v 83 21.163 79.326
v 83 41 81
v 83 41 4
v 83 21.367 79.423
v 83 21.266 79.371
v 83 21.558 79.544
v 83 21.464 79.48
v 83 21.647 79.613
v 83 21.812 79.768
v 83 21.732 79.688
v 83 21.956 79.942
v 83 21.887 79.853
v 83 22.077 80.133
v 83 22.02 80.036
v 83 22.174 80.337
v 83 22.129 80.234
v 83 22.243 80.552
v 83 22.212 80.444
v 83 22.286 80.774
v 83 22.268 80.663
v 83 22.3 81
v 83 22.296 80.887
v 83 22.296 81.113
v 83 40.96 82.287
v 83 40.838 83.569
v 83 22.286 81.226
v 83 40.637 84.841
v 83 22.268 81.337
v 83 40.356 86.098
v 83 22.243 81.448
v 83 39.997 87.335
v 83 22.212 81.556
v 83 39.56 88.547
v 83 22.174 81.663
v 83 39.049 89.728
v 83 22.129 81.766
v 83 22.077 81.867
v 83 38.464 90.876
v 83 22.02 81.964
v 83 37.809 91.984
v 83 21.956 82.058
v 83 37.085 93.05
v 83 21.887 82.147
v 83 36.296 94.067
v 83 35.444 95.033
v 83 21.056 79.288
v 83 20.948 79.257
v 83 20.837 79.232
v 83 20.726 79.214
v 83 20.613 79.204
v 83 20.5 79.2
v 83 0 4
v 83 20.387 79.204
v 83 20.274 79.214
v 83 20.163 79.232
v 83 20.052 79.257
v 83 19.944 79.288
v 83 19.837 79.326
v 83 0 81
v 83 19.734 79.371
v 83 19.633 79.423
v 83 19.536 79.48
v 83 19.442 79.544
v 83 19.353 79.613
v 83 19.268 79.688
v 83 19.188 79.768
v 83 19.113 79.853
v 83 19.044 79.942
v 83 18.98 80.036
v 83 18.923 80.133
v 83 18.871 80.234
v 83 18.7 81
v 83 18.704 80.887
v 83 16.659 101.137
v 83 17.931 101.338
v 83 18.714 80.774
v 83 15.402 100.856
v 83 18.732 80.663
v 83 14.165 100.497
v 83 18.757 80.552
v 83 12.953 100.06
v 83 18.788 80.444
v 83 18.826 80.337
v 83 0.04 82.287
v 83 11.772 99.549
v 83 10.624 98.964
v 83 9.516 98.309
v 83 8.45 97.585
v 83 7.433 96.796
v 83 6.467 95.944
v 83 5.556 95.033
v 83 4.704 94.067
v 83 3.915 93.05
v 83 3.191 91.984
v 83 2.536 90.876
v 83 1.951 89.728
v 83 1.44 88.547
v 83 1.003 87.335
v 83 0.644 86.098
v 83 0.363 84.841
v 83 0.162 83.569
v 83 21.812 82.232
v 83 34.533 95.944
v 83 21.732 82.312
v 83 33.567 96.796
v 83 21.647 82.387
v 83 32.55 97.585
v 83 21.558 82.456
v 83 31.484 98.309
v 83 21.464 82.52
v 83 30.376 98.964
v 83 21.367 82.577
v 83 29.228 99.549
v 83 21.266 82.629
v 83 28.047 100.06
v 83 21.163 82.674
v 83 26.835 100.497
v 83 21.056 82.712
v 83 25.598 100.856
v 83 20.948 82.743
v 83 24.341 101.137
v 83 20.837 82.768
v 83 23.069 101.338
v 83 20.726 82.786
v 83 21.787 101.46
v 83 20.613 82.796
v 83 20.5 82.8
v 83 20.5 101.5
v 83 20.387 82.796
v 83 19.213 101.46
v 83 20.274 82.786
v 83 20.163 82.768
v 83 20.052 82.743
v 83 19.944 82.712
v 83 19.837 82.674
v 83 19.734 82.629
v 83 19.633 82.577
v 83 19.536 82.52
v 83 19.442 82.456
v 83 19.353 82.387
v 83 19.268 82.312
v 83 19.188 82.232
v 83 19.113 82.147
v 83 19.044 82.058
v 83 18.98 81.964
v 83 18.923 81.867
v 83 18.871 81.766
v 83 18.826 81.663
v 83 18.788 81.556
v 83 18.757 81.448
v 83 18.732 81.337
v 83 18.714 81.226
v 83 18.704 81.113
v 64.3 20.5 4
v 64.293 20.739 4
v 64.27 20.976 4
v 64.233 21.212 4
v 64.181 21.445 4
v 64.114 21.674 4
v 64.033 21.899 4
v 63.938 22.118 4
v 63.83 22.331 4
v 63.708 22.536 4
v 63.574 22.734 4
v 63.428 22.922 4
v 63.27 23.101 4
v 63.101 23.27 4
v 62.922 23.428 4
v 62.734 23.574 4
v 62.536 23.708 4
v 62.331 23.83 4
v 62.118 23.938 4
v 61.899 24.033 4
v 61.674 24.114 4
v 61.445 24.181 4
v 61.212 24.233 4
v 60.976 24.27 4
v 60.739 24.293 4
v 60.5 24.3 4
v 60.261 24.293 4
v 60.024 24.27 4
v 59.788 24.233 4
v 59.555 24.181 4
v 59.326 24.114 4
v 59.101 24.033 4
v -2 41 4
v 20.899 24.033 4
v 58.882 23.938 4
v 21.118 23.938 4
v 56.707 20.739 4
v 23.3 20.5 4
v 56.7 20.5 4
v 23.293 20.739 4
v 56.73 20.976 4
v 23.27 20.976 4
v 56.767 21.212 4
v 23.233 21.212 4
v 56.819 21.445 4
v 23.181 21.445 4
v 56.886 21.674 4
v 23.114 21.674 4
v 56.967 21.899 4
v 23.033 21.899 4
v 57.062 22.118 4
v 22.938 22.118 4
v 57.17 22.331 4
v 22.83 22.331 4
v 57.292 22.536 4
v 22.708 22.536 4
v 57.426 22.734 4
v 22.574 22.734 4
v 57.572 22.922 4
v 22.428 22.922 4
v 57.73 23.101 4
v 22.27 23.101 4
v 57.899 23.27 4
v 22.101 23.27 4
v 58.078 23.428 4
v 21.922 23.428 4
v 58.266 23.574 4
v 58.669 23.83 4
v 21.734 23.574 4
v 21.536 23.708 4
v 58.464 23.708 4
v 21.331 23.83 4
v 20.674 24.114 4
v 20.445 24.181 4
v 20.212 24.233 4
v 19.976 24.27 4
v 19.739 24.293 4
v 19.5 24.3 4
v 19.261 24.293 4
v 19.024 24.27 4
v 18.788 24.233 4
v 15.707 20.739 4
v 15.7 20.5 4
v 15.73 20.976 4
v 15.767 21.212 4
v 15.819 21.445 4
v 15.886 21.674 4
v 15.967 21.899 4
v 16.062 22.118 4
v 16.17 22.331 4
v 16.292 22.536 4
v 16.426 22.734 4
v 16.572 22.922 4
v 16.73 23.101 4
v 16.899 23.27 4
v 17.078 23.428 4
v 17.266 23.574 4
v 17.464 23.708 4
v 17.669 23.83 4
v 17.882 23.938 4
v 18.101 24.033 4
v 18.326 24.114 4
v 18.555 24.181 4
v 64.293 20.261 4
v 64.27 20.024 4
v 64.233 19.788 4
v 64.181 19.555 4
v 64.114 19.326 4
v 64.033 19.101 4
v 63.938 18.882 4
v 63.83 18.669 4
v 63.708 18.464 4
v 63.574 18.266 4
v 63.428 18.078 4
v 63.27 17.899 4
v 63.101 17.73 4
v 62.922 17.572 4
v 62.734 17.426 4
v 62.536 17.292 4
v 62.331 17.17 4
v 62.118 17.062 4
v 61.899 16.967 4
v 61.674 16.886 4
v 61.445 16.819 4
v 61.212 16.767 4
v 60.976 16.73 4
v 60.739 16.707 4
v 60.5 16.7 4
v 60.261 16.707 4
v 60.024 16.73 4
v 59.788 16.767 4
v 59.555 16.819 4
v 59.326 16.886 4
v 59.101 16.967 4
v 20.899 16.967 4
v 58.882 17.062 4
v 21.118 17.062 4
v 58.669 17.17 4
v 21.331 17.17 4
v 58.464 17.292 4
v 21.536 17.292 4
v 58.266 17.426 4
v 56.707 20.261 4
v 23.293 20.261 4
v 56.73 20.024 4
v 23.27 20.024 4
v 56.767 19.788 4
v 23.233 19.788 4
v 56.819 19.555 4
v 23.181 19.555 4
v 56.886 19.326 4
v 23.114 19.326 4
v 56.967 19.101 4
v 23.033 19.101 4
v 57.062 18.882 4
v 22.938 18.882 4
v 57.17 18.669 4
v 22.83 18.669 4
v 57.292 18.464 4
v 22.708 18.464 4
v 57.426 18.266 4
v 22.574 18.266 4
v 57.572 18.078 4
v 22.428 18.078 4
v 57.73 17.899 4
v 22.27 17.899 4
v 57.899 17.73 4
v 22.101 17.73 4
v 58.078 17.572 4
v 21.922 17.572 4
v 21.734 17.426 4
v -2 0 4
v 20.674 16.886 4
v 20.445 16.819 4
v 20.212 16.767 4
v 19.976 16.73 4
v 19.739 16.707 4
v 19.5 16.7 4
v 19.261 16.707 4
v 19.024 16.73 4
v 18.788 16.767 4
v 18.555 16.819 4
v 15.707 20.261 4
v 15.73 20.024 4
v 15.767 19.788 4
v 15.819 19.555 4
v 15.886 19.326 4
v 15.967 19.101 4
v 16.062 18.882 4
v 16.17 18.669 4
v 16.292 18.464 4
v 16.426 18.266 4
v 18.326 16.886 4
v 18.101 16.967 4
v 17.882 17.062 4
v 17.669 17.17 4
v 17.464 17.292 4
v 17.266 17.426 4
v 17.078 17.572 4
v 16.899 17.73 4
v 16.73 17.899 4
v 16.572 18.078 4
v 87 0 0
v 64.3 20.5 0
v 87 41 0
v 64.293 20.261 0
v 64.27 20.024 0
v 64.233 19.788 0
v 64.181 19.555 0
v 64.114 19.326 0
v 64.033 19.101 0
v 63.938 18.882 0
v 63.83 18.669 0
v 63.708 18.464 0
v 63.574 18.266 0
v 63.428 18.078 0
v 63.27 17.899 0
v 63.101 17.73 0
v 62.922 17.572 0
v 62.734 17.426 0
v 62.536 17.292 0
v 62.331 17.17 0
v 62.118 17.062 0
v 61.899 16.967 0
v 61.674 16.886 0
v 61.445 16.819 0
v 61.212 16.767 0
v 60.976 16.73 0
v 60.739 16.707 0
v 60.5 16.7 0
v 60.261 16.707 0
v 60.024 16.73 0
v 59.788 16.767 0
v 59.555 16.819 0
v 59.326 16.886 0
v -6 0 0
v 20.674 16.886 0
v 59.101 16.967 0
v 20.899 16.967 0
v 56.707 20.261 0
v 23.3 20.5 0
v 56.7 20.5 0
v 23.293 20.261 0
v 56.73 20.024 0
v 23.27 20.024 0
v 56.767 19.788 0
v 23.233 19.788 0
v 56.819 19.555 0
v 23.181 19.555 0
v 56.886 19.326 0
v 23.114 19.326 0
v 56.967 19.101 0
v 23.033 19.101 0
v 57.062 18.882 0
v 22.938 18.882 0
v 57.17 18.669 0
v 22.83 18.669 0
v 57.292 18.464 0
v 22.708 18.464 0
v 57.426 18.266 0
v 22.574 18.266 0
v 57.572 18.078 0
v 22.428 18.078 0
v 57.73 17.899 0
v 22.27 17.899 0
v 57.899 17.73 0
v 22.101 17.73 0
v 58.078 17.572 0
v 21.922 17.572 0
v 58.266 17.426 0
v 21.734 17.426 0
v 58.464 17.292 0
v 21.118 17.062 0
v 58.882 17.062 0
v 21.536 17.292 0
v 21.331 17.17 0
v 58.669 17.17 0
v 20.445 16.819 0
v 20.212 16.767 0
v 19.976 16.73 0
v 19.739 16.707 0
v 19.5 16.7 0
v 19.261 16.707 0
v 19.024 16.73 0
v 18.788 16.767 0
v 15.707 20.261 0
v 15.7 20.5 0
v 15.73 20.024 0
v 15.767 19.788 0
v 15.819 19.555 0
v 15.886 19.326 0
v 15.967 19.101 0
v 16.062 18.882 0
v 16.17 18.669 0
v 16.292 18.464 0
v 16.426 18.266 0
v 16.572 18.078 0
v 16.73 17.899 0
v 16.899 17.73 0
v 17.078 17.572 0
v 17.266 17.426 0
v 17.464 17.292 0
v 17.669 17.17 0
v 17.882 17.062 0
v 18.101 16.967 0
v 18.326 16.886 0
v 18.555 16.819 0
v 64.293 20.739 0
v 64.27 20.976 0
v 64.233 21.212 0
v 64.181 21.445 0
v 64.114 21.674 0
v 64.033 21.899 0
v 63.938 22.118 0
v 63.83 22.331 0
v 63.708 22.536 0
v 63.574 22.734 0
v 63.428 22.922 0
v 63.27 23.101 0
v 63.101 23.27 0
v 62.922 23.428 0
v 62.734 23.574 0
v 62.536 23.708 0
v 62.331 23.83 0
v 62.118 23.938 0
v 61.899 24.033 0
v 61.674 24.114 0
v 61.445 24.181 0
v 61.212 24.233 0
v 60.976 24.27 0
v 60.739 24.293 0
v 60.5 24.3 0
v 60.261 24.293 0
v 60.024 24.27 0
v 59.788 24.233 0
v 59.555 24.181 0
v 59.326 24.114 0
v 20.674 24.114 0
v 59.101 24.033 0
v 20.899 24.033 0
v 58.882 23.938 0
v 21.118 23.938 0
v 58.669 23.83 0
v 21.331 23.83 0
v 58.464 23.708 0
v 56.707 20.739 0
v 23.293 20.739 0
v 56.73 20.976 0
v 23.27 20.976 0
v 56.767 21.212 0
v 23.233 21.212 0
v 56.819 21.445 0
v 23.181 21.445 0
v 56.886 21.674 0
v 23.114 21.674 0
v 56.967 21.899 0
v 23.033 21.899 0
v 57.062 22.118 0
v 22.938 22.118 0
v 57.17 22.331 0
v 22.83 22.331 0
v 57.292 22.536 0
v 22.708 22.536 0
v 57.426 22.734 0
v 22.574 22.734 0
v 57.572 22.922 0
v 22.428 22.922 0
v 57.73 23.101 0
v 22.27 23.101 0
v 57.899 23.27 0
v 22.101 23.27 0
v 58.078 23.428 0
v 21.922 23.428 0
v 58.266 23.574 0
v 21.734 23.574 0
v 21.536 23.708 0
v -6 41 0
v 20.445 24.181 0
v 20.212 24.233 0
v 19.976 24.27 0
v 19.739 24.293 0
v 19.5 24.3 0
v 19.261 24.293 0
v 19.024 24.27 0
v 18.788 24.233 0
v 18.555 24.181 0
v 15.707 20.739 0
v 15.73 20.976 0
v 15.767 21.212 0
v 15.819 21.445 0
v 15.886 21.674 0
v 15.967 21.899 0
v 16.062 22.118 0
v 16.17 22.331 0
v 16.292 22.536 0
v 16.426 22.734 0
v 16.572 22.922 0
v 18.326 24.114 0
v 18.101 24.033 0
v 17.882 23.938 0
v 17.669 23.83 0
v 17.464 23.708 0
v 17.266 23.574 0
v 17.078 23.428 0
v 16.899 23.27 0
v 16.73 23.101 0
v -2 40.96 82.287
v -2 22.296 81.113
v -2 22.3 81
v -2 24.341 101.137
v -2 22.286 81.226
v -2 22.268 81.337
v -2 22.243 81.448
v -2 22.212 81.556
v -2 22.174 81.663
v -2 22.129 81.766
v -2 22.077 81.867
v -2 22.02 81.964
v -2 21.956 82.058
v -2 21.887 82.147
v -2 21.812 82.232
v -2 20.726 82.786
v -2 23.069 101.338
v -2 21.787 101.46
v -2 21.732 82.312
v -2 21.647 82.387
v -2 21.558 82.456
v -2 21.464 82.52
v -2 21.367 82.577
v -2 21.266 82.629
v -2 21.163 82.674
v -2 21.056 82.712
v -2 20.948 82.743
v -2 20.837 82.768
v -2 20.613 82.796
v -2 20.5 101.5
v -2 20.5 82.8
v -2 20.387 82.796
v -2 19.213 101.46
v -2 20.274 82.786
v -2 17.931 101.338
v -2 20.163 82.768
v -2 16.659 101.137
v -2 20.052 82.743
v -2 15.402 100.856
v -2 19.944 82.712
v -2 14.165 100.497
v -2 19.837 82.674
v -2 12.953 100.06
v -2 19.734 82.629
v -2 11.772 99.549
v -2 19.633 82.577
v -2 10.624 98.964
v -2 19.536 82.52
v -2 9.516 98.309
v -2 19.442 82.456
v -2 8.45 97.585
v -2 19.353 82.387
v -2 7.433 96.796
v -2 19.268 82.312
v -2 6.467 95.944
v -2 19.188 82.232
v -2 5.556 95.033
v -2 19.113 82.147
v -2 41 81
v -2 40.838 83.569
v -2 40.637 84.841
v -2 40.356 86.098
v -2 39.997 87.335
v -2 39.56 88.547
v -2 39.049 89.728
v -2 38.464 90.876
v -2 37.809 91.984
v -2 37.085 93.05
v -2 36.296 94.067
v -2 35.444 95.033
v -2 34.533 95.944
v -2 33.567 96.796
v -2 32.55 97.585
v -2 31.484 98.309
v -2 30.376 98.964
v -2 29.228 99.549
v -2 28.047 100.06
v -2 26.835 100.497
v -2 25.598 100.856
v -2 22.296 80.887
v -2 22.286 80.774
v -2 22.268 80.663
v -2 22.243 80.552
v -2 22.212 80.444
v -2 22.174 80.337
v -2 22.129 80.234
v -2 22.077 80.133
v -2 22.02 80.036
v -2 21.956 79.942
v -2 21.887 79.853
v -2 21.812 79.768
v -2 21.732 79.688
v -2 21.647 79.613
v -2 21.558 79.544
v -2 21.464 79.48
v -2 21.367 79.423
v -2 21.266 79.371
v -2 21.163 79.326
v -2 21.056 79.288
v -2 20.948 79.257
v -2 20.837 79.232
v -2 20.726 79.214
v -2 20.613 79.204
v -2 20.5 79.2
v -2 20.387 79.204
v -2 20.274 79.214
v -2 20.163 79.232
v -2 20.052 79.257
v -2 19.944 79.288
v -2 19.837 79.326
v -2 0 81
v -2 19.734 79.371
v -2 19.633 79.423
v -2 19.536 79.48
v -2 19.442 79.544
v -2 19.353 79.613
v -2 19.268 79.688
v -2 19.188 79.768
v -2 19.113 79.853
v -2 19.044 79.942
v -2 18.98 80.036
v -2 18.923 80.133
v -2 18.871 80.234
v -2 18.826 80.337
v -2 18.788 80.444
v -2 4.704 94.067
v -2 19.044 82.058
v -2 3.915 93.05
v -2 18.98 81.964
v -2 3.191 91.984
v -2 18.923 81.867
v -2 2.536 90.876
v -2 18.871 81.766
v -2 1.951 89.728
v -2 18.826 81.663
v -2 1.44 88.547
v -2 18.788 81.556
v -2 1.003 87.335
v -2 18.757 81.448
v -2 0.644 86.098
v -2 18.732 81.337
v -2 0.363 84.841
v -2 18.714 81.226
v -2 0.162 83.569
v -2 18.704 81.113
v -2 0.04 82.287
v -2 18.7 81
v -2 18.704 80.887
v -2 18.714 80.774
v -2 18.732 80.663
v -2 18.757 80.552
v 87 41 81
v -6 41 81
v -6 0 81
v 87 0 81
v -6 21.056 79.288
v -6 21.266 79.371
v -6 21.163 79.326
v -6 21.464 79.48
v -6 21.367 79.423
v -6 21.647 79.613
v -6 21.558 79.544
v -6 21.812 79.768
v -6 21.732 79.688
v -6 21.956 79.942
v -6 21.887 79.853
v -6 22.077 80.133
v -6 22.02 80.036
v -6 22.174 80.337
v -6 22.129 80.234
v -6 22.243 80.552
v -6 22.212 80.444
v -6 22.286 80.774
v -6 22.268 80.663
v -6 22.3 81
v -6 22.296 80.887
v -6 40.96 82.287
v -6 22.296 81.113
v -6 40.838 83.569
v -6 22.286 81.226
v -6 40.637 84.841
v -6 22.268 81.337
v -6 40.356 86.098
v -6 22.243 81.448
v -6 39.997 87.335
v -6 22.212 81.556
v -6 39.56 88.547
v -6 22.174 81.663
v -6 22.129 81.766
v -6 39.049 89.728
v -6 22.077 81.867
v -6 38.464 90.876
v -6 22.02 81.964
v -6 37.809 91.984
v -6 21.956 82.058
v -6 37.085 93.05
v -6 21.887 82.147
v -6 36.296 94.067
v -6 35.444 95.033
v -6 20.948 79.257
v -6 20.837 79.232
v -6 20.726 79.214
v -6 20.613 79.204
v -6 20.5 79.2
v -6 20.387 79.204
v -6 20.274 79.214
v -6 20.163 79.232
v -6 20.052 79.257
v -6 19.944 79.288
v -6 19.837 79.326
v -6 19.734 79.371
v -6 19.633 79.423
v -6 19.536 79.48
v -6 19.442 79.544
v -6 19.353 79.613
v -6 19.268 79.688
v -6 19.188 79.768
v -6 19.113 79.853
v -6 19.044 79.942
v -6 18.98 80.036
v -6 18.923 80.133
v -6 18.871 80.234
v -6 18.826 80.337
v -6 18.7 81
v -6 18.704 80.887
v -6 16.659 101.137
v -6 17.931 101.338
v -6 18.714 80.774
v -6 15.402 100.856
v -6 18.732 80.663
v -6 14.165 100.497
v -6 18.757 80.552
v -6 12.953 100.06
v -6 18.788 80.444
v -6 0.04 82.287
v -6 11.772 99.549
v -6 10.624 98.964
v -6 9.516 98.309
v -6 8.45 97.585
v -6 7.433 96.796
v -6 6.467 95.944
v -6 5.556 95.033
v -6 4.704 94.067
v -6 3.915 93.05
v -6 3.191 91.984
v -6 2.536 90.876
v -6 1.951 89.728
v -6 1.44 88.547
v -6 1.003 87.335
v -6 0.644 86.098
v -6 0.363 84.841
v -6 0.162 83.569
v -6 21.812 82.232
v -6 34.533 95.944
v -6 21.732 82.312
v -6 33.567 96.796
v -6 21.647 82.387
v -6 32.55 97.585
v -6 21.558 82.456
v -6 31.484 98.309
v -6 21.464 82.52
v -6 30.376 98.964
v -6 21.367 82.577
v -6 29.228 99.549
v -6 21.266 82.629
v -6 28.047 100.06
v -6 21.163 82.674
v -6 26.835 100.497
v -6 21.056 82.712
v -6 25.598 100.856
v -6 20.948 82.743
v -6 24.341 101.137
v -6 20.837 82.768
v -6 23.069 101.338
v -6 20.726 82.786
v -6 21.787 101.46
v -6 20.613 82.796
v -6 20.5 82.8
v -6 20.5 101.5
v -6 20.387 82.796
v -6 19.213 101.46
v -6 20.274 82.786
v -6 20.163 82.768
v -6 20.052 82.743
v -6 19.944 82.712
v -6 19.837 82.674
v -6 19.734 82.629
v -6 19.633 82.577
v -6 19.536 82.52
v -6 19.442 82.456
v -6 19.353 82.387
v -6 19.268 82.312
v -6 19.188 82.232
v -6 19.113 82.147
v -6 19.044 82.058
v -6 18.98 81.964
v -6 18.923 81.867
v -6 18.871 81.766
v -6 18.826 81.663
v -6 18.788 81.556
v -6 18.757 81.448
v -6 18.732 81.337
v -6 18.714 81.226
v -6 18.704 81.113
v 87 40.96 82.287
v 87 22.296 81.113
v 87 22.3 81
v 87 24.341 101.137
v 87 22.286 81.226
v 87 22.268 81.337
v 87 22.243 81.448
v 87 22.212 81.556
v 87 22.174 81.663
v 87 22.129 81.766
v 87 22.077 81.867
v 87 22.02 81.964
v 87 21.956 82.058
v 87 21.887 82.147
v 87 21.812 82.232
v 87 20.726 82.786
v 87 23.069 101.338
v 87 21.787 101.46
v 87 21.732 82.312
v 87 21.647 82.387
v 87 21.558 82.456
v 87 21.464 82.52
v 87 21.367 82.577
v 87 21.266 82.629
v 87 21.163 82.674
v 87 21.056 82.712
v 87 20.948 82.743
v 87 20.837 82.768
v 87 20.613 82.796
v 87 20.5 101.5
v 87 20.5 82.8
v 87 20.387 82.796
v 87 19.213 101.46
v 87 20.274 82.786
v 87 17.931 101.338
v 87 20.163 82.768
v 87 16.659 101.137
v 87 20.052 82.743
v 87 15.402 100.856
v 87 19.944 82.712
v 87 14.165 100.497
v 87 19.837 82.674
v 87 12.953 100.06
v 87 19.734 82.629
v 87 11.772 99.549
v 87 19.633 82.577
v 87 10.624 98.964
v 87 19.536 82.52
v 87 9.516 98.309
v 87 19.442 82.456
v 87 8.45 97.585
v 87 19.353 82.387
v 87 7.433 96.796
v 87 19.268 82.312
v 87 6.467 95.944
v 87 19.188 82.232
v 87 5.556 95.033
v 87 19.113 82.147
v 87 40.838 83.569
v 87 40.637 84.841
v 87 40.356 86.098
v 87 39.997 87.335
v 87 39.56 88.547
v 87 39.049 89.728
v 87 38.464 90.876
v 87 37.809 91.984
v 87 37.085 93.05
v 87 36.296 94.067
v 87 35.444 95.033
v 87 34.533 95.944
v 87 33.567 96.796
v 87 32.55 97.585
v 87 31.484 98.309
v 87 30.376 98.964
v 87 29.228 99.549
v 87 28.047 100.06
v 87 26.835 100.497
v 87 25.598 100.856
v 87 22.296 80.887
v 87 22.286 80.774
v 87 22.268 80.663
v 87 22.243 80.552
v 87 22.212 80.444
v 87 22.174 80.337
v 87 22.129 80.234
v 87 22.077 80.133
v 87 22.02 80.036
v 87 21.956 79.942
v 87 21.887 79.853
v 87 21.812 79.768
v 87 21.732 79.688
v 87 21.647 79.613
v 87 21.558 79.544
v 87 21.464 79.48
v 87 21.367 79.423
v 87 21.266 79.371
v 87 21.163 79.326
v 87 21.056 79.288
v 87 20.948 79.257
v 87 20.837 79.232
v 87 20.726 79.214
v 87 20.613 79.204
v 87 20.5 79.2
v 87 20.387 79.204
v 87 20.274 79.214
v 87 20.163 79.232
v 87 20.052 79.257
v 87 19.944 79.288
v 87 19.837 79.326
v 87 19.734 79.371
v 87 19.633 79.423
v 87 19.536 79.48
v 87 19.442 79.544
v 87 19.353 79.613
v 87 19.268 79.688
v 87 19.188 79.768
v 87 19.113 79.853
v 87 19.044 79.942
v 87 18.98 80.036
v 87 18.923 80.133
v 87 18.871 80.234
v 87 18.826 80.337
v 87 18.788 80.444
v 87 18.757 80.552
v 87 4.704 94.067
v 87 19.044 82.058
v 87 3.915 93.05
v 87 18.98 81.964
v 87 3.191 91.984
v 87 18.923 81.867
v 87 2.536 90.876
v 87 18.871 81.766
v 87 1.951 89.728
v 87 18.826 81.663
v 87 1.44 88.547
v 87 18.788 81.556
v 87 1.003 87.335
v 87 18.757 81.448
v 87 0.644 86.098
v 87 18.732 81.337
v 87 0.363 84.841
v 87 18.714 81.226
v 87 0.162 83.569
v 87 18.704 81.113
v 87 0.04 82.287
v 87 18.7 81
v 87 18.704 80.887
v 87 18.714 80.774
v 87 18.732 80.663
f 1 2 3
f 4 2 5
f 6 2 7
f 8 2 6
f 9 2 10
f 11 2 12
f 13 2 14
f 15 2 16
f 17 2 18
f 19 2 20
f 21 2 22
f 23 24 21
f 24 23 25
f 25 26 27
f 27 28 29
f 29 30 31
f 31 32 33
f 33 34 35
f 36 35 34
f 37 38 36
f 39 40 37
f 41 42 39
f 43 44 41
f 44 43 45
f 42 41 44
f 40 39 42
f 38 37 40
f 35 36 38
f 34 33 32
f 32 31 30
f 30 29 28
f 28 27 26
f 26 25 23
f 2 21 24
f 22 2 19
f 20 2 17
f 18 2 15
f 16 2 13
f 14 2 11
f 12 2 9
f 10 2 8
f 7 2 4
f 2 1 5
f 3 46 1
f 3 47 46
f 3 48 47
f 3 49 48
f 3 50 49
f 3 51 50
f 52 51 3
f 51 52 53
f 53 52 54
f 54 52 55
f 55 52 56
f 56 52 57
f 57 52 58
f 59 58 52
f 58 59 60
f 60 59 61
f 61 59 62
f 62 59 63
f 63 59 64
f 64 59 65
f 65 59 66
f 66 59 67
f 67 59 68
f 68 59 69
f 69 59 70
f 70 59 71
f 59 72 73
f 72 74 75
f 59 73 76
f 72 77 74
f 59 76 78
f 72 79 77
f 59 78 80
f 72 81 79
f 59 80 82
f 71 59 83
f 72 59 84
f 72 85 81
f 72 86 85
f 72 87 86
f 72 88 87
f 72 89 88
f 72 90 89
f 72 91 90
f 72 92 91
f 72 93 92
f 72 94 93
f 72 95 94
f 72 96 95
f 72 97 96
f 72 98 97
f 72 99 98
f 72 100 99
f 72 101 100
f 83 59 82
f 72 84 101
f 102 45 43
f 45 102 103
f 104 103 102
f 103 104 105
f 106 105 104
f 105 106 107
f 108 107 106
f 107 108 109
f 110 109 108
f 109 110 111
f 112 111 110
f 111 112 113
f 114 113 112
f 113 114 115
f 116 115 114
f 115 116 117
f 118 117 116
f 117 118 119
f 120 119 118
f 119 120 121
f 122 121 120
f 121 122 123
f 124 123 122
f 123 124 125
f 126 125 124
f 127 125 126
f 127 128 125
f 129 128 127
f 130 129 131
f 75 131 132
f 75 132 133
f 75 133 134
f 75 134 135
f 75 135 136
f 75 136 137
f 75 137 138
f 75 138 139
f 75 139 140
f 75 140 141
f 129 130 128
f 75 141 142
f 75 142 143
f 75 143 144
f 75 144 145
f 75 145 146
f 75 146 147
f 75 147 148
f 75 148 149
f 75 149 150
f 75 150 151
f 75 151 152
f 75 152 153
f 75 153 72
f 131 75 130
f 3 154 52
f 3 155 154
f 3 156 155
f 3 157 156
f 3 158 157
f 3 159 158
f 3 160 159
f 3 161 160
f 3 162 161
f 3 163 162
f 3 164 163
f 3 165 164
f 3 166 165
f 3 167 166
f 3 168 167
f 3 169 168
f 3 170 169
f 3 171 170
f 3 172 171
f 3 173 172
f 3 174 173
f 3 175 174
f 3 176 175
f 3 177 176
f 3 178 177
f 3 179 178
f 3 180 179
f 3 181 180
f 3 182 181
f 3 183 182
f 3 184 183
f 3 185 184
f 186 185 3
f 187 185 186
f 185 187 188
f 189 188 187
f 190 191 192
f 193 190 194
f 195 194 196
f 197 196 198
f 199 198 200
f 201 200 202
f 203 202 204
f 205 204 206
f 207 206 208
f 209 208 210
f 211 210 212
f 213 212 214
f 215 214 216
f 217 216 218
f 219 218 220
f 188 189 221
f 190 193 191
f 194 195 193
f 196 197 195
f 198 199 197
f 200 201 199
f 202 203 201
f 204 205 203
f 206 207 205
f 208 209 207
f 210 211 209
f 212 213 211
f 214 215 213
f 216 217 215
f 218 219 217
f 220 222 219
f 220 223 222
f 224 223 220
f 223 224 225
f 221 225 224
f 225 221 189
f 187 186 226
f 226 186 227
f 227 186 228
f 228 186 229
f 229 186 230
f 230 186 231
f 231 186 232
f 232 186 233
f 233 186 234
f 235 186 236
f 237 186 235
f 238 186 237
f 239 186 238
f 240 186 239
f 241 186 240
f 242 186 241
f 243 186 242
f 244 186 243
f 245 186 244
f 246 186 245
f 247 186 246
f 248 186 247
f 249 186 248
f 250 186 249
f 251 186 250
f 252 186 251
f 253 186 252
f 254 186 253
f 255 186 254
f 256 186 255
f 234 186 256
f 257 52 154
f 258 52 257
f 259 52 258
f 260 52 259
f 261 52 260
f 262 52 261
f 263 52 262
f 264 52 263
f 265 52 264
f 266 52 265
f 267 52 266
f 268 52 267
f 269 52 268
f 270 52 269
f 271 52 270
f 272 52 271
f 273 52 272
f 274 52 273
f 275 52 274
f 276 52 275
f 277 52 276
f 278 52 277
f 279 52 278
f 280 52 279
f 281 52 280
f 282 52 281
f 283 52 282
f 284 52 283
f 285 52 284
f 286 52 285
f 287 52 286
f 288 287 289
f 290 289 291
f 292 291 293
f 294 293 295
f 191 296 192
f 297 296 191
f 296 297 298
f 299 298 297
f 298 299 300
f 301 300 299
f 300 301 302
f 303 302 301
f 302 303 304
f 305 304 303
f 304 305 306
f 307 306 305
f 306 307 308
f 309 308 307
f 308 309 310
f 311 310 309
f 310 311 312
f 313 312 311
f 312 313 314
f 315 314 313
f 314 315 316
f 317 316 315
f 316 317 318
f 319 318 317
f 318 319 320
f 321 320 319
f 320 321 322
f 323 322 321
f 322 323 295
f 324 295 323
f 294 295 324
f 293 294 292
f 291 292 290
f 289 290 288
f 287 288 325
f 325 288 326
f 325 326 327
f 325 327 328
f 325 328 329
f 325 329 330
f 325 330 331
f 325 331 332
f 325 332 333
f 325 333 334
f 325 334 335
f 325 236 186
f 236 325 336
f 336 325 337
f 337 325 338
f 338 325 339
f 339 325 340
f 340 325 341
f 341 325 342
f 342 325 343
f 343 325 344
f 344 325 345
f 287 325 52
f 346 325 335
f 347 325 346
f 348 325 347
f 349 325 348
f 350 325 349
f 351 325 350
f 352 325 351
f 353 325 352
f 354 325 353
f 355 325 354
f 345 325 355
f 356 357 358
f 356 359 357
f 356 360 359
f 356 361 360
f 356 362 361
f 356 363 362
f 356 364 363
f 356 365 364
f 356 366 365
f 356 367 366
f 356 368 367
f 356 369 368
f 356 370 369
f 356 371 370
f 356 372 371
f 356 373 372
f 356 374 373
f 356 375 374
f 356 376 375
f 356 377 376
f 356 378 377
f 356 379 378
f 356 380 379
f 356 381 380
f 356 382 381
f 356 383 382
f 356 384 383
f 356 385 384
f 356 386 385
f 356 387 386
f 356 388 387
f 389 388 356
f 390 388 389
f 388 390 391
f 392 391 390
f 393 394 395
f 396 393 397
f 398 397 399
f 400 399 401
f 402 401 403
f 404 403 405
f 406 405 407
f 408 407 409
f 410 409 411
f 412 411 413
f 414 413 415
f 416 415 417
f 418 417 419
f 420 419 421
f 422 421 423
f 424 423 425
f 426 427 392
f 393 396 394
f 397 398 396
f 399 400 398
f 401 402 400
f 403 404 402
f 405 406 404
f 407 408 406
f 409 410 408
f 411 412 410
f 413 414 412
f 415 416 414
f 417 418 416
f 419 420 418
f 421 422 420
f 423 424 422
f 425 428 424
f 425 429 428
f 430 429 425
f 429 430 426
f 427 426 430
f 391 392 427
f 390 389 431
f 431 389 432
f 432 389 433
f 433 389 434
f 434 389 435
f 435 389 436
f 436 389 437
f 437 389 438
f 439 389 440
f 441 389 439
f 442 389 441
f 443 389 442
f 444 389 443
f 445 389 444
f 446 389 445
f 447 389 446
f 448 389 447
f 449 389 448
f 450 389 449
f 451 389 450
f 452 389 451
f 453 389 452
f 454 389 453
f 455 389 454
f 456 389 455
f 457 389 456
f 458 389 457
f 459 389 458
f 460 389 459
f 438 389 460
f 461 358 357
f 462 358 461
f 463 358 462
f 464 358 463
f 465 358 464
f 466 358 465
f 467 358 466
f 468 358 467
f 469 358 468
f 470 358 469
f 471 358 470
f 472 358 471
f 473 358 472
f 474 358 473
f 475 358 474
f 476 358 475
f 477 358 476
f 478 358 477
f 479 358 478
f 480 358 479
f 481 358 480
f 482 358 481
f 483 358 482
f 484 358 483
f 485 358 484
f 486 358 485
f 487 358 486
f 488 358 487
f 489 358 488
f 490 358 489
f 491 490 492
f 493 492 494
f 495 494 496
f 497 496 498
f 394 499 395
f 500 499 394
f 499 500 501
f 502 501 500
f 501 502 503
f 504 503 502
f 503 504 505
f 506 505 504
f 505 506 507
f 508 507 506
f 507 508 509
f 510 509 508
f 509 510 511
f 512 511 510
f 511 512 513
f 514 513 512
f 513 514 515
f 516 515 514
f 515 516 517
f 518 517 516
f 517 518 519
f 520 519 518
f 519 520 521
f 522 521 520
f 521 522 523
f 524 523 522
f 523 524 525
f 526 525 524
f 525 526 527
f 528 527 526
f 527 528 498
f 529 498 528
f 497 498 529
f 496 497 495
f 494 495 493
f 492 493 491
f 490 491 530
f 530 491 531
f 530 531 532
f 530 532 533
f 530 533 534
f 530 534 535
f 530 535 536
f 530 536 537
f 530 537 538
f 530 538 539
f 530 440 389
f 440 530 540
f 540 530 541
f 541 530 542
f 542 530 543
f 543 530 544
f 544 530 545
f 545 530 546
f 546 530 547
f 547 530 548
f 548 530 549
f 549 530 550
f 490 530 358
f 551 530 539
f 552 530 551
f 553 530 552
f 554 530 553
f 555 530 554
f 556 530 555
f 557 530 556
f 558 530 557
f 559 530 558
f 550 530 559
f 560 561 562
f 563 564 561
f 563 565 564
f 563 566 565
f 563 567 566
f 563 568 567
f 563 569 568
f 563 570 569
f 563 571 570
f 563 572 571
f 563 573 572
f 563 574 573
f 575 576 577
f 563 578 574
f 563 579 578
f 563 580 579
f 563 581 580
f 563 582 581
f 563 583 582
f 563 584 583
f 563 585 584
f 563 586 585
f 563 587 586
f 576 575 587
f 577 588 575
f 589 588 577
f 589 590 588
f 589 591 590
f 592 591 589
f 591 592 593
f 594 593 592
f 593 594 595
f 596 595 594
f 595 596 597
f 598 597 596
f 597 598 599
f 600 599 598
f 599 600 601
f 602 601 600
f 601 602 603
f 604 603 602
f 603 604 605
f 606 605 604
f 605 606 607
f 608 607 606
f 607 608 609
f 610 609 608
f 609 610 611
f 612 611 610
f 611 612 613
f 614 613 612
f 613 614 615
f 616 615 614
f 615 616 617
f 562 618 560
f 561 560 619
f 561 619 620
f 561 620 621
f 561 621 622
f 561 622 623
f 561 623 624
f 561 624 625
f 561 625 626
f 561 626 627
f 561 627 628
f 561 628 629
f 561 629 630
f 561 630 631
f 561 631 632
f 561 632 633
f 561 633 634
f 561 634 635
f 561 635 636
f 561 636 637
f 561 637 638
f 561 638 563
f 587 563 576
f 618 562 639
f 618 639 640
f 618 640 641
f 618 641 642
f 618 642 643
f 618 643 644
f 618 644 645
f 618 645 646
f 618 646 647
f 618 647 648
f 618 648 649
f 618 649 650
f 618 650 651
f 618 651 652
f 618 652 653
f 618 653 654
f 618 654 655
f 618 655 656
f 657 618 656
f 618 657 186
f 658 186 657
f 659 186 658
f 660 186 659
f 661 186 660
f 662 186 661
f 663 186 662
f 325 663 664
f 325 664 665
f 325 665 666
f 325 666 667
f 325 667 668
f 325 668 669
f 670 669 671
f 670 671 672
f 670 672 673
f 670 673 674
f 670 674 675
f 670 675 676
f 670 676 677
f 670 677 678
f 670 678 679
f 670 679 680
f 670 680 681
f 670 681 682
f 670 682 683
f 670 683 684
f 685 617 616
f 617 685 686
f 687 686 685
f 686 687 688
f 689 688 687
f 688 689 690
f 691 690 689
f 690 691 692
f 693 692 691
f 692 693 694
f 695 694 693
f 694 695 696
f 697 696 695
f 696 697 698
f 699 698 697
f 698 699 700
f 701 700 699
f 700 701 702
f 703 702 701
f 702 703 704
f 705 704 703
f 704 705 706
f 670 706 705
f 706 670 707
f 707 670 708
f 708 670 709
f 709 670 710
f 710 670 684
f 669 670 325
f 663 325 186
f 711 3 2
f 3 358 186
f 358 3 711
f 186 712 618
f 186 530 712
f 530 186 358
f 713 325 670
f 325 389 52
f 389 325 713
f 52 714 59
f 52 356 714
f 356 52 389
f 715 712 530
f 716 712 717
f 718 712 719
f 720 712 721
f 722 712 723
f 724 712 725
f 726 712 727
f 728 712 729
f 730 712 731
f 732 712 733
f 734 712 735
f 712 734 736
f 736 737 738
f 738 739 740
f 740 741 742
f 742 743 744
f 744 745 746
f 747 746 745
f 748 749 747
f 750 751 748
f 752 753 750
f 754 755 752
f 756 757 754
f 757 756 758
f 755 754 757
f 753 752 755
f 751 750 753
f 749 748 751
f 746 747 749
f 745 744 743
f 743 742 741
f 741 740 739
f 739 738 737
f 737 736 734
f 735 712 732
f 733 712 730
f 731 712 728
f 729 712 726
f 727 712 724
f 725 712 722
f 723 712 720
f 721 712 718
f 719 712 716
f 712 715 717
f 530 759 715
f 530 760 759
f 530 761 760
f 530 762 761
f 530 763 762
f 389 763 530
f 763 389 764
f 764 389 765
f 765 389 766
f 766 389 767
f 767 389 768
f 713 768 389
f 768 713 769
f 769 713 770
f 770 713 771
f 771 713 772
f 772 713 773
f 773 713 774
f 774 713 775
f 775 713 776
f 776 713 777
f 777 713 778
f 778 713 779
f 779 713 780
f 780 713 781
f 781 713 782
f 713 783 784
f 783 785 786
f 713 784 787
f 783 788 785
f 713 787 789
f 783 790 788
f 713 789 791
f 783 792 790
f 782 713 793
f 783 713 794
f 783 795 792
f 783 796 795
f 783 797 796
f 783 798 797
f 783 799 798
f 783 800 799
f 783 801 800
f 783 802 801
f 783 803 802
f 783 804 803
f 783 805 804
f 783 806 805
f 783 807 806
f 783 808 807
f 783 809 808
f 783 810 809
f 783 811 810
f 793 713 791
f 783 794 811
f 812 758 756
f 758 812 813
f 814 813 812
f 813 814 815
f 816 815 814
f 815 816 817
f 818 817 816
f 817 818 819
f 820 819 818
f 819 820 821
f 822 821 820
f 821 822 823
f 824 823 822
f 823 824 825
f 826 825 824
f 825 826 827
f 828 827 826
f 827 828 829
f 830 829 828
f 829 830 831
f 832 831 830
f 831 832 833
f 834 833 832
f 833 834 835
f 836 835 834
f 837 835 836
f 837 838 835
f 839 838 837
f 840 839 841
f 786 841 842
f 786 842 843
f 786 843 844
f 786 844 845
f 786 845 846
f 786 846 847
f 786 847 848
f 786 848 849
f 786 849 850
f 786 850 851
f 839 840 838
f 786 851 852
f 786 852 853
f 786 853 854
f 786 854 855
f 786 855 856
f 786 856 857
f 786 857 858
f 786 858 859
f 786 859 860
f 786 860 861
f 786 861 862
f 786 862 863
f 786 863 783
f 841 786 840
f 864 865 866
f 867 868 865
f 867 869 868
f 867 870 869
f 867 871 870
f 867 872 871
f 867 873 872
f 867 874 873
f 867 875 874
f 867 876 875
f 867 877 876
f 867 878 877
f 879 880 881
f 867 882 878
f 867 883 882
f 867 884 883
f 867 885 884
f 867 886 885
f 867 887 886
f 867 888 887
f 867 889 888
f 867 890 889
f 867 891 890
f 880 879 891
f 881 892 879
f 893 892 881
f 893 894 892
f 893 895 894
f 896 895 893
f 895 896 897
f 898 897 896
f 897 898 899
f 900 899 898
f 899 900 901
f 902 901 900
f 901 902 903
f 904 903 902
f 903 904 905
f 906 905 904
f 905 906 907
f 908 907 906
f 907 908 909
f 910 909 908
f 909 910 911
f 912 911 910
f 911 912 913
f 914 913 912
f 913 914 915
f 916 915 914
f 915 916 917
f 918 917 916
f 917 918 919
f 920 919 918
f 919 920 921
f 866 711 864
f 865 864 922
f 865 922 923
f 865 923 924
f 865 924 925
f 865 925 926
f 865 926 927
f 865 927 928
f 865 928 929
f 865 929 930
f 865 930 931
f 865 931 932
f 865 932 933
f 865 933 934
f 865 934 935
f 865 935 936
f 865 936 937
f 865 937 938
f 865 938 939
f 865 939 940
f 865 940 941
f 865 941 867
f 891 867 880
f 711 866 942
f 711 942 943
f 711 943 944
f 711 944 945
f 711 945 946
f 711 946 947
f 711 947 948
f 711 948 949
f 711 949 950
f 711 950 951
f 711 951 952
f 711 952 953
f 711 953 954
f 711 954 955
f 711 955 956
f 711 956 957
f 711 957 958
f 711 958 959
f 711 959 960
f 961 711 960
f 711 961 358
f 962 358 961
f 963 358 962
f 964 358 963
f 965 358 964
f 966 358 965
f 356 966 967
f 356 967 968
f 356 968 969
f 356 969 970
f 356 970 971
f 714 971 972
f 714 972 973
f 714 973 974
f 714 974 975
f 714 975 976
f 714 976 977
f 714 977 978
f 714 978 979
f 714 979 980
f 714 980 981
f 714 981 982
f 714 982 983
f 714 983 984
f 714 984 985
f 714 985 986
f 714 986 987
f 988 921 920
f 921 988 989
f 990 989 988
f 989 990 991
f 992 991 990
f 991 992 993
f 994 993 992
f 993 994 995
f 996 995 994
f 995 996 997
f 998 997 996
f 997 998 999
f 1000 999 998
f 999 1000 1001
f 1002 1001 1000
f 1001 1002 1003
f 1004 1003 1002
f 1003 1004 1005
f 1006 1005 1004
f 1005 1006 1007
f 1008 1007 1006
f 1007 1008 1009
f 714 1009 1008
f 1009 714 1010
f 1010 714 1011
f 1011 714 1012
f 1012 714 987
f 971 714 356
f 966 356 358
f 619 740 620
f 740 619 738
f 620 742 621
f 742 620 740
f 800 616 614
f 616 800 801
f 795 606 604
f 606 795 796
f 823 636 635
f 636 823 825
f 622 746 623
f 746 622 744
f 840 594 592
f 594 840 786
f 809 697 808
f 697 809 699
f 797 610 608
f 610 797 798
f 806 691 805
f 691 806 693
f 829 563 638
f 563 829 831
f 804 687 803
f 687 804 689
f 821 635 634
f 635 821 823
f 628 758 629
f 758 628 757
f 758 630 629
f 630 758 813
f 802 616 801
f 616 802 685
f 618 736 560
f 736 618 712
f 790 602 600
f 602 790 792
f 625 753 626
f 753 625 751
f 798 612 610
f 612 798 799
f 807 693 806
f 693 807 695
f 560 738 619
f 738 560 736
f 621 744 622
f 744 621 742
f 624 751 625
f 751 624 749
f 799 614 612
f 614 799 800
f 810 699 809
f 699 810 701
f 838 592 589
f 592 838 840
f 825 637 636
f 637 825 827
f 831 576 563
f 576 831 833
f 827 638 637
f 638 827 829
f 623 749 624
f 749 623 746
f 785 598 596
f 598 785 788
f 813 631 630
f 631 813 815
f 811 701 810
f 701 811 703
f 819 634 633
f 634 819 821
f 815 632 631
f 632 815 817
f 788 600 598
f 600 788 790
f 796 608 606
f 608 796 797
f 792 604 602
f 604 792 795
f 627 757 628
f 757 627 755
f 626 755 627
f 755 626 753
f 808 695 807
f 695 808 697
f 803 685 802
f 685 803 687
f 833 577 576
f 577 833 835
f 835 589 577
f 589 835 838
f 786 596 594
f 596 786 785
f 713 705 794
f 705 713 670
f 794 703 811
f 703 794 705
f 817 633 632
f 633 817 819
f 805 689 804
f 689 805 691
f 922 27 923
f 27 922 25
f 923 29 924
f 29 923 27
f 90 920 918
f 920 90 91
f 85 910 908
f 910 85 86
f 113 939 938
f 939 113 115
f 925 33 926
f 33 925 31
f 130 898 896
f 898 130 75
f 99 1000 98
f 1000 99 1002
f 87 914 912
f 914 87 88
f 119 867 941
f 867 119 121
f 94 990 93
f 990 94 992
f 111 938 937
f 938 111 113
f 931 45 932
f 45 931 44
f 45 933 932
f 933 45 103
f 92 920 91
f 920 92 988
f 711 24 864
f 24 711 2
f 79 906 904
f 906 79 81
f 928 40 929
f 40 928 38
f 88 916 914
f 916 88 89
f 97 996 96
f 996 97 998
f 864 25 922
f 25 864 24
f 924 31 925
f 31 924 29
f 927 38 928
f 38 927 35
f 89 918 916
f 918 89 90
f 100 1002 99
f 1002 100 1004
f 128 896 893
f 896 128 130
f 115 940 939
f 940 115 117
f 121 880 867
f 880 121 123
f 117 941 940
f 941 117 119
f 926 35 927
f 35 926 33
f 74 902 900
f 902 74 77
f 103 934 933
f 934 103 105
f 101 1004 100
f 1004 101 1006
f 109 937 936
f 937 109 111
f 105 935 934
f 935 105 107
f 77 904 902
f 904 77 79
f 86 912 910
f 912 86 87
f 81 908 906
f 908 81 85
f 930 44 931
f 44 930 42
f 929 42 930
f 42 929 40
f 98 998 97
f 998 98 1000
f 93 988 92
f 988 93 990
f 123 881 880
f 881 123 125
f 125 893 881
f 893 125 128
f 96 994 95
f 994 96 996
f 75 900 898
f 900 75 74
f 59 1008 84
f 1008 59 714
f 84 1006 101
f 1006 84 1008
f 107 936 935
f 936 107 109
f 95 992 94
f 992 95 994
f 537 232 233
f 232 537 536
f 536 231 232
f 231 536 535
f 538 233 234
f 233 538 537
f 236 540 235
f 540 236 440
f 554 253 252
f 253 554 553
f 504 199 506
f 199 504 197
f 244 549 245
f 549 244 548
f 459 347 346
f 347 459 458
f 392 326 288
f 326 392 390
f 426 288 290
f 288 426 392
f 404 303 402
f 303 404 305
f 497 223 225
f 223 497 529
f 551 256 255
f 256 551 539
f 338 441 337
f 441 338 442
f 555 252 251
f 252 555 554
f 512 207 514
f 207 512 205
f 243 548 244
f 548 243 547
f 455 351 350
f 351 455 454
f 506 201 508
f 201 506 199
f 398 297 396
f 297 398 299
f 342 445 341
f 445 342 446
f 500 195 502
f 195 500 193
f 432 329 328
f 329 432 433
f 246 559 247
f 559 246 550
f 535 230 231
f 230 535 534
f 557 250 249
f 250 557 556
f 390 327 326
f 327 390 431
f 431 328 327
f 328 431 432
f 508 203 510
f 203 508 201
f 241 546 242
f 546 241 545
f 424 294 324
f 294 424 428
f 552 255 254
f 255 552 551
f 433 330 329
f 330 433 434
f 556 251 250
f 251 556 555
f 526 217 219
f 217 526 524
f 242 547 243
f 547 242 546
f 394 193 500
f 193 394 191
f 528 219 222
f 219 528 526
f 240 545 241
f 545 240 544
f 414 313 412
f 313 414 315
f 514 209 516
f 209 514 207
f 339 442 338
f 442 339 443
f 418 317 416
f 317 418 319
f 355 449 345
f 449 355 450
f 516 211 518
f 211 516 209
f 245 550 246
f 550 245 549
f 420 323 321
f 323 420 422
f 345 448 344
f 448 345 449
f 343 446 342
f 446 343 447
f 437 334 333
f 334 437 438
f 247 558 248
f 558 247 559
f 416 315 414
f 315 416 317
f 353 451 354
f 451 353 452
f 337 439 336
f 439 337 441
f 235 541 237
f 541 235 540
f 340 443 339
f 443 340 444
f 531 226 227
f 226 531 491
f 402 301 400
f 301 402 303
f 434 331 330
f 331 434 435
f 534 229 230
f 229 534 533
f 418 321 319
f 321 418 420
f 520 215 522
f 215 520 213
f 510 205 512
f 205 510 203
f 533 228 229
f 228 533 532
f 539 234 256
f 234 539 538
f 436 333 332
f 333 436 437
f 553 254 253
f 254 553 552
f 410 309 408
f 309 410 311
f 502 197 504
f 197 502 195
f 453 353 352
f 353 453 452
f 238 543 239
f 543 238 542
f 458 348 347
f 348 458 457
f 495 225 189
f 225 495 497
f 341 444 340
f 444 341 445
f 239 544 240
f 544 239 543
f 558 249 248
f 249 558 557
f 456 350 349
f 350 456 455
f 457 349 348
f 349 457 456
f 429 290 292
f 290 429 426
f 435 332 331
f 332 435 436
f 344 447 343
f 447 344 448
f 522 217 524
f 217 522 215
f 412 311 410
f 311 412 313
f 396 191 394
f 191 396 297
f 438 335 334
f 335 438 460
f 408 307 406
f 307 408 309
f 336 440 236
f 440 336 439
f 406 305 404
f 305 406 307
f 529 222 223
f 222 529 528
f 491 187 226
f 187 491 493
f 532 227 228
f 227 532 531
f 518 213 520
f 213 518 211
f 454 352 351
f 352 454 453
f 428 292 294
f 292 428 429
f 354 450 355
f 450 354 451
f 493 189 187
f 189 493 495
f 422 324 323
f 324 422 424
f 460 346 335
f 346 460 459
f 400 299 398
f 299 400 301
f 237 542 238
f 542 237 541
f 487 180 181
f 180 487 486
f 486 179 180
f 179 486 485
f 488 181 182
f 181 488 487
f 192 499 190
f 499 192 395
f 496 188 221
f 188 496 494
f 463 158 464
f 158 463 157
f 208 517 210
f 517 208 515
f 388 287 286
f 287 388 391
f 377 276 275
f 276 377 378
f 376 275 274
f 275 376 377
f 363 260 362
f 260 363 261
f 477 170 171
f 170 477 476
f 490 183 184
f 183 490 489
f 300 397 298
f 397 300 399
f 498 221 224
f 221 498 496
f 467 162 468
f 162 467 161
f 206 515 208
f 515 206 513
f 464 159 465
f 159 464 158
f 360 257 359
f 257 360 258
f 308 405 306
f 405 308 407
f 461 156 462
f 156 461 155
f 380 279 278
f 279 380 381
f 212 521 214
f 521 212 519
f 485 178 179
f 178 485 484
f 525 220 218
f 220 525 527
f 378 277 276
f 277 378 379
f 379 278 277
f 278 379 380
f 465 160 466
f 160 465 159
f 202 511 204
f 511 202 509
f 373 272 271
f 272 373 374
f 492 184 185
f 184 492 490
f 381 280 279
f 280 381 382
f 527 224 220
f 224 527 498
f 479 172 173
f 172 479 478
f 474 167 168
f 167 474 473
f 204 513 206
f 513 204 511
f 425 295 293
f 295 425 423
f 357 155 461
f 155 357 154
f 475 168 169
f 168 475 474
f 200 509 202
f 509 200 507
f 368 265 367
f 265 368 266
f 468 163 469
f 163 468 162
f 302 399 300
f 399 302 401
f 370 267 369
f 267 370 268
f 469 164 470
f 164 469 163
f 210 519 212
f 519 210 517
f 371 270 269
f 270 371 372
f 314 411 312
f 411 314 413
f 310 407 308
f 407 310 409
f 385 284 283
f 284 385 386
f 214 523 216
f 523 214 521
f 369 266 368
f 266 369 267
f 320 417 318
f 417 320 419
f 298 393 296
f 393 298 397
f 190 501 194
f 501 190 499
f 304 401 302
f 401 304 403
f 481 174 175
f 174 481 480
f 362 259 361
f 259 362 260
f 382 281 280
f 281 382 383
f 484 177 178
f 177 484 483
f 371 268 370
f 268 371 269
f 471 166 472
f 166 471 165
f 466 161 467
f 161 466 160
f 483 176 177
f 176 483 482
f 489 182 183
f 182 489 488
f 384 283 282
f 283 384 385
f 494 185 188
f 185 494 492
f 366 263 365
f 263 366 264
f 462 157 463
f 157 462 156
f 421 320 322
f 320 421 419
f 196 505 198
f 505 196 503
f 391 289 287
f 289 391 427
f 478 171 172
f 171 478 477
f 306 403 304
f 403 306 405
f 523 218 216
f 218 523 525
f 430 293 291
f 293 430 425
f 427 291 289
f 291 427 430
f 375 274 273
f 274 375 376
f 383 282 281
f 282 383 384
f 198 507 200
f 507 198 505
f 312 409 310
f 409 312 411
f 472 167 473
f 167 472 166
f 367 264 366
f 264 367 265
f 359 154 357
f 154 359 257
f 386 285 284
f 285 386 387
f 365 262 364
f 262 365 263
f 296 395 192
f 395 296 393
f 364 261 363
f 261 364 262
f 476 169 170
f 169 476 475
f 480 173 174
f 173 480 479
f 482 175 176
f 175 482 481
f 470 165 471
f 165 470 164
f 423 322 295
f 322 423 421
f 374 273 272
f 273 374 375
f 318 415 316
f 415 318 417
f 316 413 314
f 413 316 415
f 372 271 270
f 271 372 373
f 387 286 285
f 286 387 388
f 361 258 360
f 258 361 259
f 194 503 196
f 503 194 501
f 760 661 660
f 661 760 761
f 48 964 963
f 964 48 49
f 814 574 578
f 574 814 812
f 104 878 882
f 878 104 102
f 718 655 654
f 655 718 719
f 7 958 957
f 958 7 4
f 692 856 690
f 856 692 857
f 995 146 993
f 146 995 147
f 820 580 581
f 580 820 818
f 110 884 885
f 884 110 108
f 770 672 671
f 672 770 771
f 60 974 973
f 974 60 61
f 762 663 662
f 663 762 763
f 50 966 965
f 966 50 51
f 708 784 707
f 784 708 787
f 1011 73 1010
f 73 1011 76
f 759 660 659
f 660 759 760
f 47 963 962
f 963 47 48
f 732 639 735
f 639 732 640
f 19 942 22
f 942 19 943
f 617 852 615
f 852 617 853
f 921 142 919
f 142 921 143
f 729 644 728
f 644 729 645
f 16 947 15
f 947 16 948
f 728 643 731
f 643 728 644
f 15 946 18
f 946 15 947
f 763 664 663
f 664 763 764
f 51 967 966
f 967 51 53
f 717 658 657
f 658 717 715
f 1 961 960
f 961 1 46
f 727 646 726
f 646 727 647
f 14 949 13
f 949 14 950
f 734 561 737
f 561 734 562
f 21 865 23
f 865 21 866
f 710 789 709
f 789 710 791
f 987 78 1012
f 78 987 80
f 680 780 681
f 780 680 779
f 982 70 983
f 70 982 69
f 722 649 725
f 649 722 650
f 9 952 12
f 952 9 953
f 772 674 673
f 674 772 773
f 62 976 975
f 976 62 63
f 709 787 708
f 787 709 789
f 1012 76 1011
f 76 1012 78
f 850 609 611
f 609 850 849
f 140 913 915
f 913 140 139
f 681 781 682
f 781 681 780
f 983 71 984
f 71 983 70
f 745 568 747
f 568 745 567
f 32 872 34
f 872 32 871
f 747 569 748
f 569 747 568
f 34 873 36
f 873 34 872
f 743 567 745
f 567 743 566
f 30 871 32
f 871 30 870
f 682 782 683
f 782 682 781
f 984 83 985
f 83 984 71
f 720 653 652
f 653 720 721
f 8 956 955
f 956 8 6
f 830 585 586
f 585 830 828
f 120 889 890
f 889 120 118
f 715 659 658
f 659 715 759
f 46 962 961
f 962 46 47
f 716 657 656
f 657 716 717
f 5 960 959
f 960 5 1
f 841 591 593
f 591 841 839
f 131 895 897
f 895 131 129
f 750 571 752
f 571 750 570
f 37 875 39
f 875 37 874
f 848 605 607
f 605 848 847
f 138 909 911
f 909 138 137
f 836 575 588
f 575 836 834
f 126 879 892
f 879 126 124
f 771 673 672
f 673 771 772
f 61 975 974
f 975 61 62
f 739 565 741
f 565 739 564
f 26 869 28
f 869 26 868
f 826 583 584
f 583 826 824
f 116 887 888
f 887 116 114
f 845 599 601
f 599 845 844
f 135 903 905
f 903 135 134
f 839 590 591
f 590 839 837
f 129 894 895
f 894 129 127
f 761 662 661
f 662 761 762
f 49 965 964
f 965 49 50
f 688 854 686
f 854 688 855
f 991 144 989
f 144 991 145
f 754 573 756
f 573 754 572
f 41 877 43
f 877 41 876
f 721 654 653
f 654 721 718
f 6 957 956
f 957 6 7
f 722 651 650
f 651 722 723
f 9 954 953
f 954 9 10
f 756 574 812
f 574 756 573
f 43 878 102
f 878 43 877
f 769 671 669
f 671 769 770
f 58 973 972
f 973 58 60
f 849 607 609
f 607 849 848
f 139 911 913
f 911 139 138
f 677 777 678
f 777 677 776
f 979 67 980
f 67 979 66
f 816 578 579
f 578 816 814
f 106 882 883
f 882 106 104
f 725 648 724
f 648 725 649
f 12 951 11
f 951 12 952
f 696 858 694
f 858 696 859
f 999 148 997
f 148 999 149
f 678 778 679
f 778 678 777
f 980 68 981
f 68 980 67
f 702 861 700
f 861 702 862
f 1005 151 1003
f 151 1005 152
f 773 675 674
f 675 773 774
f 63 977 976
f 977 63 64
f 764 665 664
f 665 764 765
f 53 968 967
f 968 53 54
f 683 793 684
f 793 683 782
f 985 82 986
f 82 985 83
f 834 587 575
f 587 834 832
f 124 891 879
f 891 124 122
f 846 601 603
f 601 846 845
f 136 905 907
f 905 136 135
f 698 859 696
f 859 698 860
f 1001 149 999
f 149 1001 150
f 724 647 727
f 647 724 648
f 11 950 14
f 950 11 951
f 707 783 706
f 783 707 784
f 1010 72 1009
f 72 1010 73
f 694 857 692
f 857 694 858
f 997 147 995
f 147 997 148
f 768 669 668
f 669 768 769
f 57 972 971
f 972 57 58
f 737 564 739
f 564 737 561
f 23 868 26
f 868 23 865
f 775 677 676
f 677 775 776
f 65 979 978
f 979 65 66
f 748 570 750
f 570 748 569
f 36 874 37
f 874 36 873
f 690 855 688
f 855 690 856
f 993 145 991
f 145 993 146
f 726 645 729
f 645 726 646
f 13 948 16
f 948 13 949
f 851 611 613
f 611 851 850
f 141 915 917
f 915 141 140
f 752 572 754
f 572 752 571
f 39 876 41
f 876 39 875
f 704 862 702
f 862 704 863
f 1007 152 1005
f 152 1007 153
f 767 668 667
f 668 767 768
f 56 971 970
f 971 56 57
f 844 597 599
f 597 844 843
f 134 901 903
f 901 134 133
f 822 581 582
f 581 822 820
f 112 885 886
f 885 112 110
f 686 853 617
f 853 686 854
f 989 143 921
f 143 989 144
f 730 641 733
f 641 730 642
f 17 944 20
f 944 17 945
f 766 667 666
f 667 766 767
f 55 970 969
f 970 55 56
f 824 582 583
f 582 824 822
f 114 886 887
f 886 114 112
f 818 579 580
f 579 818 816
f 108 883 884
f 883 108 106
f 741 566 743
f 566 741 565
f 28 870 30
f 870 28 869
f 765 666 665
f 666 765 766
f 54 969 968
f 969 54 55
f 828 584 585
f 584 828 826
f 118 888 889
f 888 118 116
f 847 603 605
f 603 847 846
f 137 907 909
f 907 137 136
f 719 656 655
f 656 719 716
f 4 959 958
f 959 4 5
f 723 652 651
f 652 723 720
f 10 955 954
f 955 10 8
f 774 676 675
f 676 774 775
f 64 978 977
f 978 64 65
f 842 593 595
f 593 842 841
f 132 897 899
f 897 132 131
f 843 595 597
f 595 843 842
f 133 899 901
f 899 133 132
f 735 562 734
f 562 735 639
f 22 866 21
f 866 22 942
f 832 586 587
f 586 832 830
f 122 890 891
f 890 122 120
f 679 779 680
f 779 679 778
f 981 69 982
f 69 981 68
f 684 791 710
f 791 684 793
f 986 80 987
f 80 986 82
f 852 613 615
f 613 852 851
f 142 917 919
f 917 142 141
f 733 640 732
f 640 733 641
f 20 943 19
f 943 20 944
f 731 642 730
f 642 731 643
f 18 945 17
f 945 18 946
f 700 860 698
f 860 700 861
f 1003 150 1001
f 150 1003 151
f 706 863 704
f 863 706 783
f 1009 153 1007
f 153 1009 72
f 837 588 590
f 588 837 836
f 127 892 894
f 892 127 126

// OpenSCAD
difference(){
	union(){
        
       translate([-2,0,0]){
           cube([85,41,4], center=false);
       }

       translate([-6,0,0]){
           cube([4,41,48+15+18], center=false);
       }
       translate([83,0,0]){
           cube([4,41,48+15+18], center=false);
       }
       translate([-6,41/2,48+15+18]){
            rotate(a = [0,90,0]) {
              cylinder(h=4, r=41/2, $fn=100, center=false);
            }
       }	
       translate([83,41/2,48+15+18]){
            rotate(a = [0,90,0]) {
              cylinder(h=4, r=41/2, $fn=100, center=false);
            }
       }	


	}
	union() {
 
       translate([85/2-23,41/2,-1]){
            rotate(a = [0,0,90]) {
              cylinder(h=600, r=3.8, $fn=100, center=false);
            }
       }	
       translate([75/2+23,41/2,-1]){
            rotate(a = [0,0,90]) {
              cylinder(h=600, r=3.8, $fn=100, center=false);
            }
       }	
       
       translate([-10,41/2,48+15+18]){
            rotate(a = [0,90,0]) {
              cylinder(h=999, r=1.8, $fn=100, center=false);
            }
       }	




        
	}
}
